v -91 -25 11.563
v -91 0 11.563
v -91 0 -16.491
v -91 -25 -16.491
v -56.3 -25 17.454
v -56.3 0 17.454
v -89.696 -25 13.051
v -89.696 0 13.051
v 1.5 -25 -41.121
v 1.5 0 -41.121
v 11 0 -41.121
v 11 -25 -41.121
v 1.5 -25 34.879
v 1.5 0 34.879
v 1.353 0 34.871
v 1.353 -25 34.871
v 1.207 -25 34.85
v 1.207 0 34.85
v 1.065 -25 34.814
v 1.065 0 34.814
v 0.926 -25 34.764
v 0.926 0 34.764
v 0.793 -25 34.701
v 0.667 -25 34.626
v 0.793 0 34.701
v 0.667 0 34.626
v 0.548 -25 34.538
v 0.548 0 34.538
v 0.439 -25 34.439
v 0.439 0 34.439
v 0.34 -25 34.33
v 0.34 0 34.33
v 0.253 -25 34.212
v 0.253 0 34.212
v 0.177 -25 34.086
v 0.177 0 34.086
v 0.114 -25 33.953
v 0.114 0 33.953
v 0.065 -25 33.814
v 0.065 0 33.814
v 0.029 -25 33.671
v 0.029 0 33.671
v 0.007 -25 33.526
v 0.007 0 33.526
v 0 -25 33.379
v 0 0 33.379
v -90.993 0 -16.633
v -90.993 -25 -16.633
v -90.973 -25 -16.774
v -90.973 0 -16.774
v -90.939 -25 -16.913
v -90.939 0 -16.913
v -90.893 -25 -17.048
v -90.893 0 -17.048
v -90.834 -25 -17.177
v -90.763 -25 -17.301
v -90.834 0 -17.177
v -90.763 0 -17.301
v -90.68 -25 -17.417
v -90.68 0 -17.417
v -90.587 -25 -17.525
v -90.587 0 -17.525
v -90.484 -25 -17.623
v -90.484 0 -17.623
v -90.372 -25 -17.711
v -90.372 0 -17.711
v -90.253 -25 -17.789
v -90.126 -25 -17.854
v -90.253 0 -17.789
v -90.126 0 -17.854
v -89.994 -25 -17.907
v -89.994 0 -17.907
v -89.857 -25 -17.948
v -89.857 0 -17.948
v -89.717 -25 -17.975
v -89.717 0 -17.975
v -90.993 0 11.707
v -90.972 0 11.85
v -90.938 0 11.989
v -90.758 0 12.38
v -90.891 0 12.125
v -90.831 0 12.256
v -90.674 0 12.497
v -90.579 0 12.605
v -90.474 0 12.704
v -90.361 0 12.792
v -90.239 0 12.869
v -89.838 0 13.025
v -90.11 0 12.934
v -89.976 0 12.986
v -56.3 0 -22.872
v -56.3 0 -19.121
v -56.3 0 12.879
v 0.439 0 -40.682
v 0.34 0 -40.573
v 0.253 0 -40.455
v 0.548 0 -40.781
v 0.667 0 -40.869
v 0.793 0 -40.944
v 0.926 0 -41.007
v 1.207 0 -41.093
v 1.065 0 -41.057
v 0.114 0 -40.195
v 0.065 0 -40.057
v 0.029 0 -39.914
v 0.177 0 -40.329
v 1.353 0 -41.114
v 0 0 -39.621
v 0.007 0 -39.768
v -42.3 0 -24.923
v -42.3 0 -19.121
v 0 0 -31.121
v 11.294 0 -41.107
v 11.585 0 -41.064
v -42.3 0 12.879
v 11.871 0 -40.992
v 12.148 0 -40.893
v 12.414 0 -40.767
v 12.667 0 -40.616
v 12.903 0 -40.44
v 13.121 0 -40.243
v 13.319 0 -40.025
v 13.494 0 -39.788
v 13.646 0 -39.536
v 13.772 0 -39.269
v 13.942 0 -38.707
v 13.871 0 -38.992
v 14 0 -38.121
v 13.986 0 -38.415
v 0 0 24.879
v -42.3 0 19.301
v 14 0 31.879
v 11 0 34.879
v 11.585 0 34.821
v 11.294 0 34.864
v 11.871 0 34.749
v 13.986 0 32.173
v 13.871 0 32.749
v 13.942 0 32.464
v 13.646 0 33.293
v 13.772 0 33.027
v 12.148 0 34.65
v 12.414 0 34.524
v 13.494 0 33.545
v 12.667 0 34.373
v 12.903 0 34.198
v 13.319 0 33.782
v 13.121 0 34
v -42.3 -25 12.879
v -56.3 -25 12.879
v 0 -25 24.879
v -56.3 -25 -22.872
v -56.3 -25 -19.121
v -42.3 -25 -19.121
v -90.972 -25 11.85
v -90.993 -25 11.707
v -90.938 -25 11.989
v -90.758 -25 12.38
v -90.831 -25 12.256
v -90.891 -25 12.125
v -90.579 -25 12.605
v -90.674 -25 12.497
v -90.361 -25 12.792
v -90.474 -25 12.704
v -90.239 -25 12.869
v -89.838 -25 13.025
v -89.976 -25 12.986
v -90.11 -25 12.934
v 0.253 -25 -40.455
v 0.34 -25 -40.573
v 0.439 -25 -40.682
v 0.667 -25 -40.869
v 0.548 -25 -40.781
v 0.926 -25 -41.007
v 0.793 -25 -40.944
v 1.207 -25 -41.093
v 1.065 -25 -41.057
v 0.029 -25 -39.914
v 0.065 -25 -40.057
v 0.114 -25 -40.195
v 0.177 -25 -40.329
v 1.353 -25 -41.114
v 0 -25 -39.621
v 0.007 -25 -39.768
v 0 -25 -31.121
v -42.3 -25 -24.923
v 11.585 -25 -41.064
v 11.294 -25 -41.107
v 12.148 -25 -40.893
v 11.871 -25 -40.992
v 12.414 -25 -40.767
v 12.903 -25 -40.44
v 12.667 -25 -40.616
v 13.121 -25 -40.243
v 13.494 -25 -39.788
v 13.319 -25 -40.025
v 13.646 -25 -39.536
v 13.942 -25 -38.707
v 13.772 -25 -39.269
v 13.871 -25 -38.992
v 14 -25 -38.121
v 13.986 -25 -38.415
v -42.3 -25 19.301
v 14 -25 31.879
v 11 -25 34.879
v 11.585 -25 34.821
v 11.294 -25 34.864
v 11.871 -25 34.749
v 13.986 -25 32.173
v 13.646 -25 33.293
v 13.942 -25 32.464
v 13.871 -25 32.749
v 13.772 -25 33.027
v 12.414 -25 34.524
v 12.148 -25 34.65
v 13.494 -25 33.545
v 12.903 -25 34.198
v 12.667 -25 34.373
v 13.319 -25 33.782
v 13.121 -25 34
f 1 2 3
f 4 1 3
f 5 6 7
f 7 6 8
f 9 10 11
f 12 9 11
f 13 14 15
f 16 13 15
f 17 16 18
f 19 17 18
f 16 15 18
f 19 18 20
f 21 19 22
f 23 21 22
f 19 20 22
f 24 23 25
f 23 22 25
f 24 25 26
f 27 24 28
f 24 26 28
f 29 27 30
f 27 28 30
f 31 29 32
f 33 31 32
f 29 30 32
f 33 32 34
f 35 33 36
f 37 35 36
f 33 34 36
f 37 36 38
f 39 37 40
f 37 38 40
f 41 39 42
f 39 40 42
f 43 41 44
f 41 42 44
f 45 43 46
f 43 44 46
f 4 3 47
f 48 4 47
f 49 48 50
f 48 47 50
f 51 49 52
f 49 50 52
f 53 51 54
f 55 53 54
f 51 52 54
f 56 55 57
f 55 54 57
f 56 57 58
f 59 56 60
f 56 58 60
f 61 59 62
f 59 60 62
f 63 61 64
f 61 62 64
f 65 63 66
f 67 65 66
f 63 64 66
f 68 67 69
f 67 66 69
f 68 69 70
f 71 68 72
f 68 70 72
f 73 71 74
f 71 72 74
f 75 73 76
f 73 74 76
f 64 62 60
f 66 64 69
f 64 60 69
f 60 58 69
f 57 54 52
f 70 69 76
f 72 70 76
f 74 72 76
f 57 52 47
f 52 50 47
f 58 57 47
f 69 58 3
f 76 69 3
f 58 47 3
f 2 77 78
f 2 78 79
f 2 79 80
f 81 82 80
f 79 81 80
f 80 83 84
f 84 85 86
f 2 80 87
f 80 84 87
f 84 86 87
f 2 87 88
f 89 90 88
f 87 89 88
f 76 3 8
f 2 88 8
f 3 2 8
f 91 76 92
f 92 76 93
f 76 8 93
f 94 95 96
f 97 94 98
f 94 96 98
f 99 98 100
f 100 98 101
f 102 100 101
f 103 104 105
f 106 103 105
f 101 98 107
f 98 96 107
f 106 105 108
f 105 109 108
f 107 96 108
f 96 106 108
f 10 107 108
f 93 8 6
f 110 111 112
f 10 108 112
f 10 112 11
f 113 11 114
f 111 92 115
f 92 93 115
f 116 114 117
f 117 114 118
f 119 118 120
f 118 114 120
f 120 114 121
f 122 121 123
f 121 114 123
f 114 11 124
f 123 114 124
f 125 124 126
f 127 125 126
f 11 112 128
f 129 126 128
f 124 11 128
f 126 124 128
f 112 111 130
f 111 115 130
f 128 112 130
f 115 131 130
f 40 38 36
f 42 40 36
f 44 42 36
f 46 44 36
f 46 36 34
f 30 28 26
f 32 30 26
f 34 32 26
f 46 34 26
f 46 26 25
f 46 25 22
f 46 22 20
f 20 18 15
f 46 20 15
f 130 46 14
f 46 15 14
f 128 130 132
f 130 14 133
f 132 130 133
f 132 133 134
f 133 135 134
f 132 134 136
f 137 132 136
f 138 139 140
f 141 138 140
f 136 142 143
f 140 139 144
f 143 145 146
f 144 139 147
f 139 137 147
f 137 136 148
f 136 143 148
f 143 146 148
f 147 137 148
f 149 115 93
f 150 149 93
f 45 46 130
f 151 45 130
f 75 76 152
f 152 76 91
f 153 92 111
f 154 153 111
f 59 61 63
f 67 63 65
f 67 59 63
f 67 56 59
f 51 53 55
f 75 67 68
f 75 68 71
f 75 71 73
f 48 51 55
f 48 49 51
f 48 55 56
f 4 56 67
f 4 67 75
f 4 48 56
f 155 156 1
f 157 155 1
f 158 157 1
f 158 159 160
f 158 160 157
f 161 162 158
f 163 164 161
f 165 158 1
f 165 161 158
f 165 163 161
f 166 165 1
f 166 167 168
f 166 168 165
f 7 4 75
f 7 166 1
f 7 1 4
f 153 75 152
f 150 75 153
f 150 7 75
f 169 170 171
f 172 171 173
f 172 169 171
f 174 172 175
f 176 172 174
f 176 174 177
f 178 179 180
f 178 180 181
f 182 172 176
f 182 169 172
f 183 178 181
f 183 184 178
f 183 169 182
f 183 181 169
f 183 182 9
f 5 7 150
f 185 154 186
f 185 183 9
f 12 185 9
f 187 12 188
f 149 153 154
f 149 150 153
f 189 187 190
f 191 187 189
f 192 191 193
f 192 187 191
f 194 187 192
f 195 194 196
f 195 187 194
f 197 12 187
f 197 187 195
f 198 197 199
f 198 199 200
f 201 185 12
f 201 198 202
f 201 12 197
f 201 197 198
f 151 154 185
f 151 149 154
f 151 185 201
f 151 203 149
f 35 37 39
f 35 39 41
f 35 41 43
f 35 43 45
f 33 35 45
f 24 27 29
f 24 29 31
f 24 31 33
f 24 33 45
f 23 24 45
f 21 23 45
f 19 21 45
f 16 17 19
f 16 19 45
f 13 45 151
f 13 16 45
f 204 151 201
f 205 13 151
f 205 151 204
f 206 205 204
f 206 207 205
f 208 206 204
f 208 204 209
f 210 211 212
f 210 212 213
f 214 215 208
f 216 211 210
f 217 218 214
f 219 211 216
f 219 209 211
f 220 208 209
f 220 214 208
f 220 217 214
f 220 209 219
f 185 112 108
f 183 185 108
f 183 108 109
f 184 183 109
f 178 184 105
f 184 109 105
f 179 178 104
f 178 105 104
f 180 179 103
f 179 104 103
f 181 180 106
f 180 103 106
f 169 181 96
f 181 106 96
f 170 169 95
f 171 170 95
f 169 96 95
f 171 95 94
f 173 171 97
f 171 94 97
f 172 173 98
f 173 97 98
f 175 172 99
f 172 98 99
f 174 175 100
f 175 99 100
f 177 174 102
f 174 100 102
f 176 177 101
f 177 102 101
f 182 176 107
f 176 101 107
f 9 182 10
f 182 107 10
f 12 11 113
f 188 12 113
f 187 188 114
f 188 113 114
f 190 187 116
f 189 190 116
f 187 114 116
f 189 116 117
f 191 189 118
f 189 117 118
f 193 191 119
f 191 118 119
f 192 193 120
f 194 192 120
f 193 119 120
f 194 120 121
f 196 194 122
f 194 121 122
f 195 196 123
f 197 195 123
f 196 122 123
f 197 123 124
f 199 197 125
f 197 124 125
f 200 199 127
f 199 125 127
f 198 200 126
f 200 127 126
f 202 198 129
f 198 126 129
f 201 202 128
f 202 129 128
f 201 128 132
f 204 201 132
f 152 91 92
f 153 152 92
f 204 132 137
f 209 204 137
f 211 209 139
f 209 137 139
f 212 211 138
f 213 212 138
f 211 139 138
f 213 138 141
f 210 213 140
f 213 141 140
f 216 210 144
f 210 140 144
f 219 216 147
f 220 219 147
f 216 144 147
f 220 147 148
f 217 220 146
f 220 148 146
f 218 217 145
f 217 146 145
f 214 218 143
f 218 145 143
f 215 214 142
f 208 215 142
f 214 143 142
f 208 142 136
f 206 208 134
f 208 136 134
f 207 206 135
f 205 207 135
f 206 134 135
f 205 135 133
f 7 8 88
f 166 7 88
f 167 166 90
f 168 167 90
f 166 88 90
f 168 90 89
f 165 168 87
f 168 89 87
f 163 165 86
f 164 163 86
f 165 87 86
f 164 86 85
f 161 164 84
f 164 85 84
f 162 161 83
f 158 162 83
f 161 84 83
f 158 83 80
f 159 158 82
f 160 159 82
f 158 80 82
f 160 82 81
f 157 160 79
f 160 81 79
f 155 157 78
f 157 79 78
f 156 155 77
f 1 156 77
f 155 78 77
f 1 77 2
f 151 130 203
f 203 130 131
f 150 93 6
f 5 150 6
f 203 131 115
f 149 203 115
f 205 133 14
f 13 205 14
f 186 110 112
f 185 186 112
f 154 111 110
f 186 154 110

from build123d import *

# Parameters (mm, degrees)
F1_DEPTH = 25


with BuildPart() as f1:
    # F0 (on Front) → F1 (new body)
    with BuildSketch(Plane.XZ):
        with BuildLine():
            Line((-56.300399, -19.121413), (-42.300399, -19.121413))
            Line((-42.300399, -19.121413), (-42.300399, -24.923176))
            Line((-42.300399, -24.923176), (0, -31.121413))
            Line((0, -31.121413), (0, -39.621413))
            ThreePointArc((0, -39.621413), (0.43934, -40.682073), (1.5, -41.121413))
            Line((1.5, -41.121413), (11, -41.121413))
            ThreePointArc((11, -41.121413), (13.12132, -40.242733), (14, -38.121413))
            Line((14, -38.121413), (14, -19.121413))
            Line((14, -19.121413), (14, 31.878587))
            ThreePointArc((14, 31.878587), (13.12132, 33.999907), (11, 34.878587))
            Line((11, 34.878587), (1.5, 34.878587))
            ThreePointArc((1.5, 34.878587), (0.43934, 34.439247), (0, 33.378587))
            Line((0, 33.378587), (0, 24.878587))
            Line((0, 24.878587), (-42.300399, 19.300512))
            Line((-42.300399, 19.300512), (-42.300399, 12.878587))
            Line((-42.300399, 12.878587), (-56.300399, 12.878587))
            Line((-56.300399, 12.878587), (-56.300399, 17.454358))
            Line((-56.300399, 17.454358), (-89.696104, 13.050529))
            ThreePointArc((-89.696104, 13.050529), (-90.627865, 12.552303), (-91, 11.563403))
            Line((-91, 11.563403), (-91, -16.491046))
            ThreePointArc((-91, -16.491046), (-90.634946, -17.471809), (-89.717471, -17.975198))
            Line((-89.717471, -17.975198), (-56.300399, -22.871769))
            Line((-56.300399, -22.871769), (-56.300399, -19.121413))
        make_face()
    extrude(amount=F1_DEPTH)


solid = f1.part
